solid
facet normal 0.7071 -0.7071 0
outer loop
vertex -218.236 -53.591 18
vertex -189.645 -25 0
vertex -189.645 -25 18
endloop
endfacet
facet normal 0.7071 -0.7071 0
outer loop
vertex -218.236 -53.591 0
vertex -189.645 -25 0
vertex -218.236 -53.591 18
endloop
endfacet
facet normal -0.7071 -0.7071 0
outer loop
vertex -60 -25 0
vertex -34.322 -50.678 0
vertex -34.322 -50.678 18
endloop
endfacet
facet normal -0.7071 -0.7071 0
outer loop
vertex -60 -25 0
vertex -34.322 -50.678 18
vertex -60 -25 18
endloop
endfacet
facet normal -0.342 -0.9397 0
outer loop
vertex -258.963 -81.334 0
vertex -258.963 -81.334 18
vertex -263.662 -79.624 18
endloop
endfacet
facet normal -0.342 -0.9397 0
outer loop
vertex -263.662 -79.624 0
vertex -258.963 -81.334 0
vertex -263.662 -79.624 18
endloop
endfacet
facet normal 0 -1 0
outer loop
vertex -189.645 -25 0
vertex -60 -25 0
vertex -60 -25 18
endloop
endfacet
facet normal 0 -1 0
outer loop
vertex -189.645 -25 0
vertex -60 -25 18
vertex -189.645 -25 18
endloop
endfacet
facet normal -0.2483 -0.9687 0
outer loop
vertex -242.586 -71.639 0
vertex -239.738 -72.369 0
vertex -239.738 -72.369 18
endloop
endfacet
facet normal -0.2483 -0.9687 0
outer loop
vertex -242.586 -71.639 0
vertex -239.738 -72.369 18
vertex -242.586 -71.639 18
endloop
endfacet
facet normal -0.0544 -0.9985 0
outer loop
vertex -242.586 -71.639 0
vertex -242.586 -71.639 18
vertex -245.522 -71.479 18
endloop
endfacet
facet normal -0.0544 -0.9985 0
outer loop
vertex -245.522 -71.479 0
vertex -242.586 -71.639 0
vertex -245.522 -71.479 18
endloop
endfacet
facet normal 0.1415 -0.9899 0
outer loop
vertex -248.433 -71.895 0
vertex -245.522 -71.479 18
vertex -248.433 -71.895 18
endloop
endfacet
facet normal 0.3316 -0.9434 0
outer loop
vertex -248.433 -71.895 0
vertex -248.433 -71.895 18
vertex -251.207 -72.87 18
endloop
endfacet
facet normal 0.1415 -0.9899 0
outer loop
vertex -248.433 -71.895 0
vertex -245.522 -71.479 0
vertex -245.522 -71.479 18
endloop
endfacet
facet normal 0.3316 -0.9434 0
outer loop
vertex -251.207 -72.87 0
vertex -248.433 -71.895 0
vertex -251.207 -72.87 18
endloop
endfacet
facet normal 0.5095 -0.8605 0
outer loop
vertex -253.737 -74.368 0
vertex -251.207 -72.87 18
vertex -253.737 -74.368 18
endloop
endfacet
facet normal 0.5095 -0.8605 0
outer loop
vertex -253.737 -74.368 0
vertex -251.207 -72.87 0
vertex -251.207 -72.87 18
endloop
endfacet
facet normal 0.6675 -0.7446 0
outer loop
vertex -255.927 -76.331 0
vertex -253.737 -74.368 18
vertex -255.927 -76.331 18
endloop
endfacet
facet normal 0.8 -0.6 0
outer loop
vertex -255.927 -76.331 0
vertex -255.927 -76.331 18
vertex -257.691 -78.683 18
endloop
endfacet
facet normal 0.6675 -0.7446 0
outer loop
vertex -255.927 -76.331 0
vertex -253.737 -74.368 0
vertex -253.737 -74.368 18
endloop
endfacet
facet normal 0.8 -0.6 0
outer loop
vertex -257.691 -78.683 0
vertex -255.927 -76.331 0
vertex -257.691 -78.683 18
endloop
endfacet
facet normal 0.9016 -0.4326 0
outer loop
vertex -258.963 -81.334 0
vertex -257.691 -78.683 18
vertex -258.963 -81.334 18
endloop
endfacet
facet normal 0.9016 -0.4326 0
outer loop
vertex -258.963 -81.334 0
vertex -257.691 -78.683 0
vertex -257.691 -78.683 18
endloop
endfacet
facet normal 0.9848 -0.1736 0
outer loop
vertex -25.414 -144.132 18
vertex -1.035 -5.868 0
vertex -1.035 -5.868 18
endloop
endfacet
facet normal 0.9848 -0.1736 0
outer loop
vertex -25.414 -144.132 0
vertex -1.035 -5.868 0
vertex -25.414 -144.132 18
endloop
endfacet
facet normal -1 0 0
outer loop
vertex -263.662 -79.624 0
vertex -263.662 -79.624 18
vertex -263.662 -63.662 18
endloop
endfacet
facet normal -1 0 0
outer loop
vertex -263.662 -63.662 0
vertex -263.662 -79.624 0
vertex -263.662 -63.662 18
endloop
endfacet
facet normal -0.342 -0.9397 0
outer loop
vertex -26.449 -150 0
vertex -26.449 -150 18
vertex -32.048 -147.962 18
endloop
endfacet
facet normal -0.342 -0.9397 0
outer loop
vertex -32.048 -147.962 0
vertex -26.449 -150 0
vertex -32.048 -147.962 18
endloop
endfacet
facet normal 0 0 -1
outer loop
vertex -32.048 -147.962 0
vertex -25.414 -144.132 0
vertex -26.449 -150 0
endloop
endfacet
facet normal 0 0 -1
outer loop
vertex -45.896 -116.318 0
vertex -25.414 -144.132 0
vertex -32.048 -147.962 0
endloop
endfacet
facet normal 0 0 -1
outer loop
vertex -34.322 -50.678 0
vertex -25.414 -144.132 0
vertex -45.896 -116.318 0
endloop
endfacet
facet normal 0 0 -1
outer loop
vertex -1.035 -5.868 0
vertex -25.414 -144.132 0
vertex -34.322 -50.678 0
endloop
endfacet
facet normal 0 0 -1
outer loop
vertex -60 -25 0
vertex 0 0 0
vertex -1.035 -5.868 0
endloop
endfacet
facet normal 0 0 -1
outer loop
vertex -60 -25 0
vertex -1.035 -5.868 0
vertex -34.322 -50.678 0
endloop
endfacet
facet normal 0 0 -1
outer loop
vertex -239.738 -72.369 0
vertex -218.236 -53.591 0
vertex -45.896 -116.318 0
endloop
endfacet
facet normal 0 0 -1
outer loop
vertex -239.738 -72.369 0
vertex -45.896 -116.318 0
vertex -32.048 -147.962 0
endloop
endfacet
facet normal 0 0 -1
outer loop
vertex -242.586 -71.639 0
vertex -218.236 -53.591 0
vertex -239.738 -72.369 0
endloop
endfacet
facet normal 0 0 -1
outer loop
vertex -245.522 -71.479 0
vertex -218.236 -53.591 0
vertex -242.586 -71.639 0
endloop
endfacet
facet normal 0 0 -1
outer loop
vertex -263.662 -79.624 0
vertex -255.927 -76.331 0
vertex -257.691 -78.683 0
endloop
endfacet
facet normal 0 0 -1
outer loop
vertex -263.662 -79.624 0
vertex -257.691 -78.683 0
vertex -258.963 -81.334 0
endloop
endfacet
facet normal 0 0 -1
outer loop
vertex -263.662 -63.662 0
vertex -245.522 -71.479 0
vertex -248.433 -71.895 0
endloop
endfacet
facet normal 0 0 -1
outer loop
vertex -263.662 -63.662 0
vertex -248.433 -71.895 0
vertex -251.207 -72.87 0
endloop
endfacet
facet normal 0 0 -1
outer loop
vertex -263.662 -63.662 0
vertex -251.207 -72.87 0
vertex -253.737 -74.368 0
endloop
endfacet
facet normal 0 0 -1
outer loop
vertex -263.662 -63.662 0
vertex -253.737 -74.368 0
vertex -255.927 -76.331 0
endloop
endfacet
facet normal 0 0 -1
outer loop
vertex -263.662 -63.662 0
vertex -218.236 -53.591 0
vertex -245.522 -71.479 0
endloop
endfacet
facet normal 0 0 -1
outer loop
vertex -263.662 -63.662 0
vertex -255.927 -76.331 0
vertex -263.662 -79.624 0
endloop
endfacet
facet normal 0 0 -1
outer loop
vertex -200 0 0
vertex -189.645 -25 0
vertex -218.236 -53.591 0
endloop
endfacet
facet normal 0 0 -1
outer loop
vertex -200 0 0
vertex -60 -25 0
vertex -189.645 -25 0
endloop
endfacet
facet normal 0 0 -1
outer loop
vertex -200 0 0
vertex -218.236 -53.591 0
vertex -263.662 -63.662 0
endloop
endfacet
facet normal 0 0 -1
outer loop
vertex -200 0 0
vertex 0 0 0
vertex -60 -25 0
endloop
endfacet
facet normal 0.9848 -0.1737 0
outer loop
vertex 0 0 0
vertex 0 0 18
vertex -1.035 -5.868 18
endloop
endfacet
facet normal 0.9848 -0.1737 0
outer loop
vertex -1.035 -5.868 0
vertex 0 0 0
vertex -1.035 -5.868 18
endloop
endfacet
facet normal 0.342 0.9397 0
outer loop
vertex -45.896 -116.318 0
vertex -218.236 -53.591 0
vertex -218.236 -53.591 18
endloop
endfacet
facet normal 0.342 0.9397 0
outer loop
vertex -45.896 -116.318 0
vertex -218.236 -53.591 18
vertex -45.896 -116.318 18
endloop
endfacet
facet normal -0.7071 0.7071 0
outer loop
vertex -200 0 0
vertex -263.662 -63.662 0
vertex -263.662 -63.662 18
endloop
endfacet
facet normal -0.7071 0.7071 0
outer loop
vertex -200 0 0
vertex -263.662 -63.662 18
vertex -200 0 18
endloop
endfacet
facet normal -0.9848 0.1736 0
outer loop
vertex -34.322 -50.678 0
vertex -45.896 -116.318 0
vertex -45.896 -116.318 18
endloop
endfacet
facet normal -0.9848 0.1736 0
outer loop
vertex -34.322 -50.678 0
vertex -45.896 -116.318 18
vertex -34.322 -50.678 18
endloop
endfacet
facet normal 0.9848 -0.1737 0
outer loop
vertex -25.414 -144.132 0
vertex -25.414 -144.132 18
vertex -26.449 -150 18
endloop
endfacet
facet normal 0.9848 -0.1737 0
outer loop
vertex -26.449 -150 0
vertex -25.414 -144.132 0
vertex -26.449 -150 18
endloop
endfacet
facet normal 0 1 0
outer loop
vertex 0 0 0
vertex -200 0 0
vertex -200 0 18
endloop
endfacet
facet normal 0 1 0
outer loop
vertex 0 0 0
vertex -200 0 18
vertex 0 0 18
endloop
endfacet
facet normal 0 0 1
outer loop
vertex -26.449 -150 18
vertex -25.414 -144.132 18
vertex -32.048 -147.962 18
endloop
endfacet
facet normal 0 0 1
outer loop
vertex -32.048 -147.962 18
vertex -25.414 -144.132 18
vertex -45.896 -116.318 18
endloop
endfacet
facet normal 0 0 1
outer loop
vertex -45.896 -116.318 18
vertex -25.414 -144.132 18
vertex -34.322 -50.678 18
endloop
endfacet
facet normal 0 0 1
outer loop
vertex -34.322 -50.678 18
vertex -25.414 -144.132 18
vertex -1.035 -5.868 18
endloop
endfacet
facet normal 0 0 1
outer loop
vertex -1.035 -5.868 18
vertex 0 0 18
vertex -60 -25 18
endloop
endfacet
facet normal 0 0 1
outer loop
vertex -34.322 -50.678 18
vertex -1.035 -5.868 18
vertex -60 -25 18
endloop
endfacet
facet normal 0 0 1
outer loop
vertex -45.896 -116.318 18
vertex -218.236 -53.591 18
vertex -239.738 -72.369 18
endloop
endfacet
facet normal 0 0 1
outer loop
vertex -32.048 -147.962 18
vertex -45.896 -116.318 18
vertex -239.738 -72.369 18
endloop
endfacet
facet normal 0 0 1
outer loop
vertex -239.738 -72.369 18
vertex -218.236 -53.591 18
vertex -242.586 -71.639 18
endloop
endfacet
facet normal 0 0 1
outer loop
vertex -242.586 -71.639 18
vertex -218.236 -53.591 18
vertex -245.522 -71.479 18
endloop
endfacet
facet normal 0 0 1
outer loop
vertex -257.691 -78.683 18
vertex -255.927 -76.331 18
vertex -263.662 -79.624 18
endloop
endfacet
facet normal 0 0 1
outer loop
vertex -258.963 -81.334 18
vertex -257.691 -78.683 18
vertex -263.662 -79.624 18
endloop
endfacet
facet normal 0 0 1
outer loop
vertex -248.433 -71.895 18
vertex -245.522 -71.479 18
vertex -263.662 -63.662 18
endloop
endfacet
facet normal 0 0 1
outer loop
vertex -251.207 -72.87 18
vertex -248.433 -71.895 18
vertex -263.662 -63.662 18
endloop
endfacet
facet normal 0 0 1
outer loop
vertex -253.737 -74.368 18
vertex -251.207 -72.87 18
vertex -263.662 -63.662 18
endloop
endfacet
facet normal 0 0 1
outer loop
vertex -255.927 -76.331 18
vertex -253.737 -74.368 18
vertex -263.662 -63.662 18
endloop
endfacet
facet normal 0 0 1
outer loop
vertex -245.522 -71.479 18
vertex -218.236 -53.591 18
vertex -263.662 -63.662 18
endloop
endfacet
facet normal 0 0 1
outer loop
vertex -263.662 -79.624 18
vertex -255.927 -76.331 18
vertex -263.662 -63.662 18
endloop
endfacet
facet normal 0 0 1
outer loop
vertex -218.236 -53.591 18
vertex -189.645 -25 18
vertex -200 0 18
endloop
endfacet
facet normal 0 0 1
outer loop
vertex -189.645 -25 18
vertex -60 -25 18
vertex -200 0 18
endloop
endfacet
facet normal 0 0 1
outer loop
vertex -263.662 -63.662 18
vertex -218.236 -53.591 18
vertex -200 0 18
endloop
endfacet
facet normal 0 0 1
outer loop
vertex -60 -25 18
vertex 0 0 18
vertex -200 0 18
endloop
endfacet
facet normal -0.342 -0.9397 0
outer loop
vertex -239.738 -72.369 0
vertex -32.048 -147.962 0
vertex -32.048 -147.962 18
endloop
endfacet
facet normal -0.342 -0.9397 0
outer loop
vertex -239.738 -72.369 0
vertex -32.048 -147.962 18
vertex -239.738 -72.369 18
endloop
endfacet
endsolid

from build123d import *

# Parameters (mm, degrees)
BOSS_EXTRUDE2_DEPTH = 18


with BuildPart() as part:
    # Sketch5 → Boss-Extrude2 (new body)
    with BuildSketch(Plane.XY):
        with BuildLine():
            ThreePointArc((-239.737512556, -72.369347264), (-251.207088632, -72.87011977), (-258.963204018, -81.334434426))
            Line((-258.963204018, -81.334434426), (-263.661667122, -79.624333709))
            Line((-263.661667122, -79.624333709), (-263.661667122, -65.732734934))
            Line((-263.661667122, -65.732734934), (-263.661667122, -63.661667122))
            Line((-263.661667122, -63.661667122), (-262.197201028, -62.197201028))
            Line((-262.197201028, -62.197201028), (-201.464466094, -1.464466094))
            Line((-201.464466094, -1.464466094), (-200, 0))
            Line((-200, 0), (-197.928932188, 0))
            Line((-197.928932188, 0), (-5.958767963, 0))
            Line((-5.958767963, 0), (0, 0))
            Line((0, 0), (-1.034729198, -5.868240888))
            Line((-1.034729198, -5.868240888), (-25.414317908, -144.131759112))
            Line((-25.414317908, -144.131759112), (-26.449047106, -150))
            Line((-26.449047106, -150), (-32.04845739, -147.961981327))
            Line((-32.04845739, -147.961981327), (-239.737512556, -72.369347264))
        make_face()
        Polygon((-218.235614695, -53.590953754), (-45.895594942, -116.317591117), (-34.321629376, -50.678370624), (-60, -25), (-189.644660941, -25), align=None, mode=Mode.SUBTRACT)
    extrude(amount=BOSS_EXTRUDE2_DEPTH)


solid = part.part
